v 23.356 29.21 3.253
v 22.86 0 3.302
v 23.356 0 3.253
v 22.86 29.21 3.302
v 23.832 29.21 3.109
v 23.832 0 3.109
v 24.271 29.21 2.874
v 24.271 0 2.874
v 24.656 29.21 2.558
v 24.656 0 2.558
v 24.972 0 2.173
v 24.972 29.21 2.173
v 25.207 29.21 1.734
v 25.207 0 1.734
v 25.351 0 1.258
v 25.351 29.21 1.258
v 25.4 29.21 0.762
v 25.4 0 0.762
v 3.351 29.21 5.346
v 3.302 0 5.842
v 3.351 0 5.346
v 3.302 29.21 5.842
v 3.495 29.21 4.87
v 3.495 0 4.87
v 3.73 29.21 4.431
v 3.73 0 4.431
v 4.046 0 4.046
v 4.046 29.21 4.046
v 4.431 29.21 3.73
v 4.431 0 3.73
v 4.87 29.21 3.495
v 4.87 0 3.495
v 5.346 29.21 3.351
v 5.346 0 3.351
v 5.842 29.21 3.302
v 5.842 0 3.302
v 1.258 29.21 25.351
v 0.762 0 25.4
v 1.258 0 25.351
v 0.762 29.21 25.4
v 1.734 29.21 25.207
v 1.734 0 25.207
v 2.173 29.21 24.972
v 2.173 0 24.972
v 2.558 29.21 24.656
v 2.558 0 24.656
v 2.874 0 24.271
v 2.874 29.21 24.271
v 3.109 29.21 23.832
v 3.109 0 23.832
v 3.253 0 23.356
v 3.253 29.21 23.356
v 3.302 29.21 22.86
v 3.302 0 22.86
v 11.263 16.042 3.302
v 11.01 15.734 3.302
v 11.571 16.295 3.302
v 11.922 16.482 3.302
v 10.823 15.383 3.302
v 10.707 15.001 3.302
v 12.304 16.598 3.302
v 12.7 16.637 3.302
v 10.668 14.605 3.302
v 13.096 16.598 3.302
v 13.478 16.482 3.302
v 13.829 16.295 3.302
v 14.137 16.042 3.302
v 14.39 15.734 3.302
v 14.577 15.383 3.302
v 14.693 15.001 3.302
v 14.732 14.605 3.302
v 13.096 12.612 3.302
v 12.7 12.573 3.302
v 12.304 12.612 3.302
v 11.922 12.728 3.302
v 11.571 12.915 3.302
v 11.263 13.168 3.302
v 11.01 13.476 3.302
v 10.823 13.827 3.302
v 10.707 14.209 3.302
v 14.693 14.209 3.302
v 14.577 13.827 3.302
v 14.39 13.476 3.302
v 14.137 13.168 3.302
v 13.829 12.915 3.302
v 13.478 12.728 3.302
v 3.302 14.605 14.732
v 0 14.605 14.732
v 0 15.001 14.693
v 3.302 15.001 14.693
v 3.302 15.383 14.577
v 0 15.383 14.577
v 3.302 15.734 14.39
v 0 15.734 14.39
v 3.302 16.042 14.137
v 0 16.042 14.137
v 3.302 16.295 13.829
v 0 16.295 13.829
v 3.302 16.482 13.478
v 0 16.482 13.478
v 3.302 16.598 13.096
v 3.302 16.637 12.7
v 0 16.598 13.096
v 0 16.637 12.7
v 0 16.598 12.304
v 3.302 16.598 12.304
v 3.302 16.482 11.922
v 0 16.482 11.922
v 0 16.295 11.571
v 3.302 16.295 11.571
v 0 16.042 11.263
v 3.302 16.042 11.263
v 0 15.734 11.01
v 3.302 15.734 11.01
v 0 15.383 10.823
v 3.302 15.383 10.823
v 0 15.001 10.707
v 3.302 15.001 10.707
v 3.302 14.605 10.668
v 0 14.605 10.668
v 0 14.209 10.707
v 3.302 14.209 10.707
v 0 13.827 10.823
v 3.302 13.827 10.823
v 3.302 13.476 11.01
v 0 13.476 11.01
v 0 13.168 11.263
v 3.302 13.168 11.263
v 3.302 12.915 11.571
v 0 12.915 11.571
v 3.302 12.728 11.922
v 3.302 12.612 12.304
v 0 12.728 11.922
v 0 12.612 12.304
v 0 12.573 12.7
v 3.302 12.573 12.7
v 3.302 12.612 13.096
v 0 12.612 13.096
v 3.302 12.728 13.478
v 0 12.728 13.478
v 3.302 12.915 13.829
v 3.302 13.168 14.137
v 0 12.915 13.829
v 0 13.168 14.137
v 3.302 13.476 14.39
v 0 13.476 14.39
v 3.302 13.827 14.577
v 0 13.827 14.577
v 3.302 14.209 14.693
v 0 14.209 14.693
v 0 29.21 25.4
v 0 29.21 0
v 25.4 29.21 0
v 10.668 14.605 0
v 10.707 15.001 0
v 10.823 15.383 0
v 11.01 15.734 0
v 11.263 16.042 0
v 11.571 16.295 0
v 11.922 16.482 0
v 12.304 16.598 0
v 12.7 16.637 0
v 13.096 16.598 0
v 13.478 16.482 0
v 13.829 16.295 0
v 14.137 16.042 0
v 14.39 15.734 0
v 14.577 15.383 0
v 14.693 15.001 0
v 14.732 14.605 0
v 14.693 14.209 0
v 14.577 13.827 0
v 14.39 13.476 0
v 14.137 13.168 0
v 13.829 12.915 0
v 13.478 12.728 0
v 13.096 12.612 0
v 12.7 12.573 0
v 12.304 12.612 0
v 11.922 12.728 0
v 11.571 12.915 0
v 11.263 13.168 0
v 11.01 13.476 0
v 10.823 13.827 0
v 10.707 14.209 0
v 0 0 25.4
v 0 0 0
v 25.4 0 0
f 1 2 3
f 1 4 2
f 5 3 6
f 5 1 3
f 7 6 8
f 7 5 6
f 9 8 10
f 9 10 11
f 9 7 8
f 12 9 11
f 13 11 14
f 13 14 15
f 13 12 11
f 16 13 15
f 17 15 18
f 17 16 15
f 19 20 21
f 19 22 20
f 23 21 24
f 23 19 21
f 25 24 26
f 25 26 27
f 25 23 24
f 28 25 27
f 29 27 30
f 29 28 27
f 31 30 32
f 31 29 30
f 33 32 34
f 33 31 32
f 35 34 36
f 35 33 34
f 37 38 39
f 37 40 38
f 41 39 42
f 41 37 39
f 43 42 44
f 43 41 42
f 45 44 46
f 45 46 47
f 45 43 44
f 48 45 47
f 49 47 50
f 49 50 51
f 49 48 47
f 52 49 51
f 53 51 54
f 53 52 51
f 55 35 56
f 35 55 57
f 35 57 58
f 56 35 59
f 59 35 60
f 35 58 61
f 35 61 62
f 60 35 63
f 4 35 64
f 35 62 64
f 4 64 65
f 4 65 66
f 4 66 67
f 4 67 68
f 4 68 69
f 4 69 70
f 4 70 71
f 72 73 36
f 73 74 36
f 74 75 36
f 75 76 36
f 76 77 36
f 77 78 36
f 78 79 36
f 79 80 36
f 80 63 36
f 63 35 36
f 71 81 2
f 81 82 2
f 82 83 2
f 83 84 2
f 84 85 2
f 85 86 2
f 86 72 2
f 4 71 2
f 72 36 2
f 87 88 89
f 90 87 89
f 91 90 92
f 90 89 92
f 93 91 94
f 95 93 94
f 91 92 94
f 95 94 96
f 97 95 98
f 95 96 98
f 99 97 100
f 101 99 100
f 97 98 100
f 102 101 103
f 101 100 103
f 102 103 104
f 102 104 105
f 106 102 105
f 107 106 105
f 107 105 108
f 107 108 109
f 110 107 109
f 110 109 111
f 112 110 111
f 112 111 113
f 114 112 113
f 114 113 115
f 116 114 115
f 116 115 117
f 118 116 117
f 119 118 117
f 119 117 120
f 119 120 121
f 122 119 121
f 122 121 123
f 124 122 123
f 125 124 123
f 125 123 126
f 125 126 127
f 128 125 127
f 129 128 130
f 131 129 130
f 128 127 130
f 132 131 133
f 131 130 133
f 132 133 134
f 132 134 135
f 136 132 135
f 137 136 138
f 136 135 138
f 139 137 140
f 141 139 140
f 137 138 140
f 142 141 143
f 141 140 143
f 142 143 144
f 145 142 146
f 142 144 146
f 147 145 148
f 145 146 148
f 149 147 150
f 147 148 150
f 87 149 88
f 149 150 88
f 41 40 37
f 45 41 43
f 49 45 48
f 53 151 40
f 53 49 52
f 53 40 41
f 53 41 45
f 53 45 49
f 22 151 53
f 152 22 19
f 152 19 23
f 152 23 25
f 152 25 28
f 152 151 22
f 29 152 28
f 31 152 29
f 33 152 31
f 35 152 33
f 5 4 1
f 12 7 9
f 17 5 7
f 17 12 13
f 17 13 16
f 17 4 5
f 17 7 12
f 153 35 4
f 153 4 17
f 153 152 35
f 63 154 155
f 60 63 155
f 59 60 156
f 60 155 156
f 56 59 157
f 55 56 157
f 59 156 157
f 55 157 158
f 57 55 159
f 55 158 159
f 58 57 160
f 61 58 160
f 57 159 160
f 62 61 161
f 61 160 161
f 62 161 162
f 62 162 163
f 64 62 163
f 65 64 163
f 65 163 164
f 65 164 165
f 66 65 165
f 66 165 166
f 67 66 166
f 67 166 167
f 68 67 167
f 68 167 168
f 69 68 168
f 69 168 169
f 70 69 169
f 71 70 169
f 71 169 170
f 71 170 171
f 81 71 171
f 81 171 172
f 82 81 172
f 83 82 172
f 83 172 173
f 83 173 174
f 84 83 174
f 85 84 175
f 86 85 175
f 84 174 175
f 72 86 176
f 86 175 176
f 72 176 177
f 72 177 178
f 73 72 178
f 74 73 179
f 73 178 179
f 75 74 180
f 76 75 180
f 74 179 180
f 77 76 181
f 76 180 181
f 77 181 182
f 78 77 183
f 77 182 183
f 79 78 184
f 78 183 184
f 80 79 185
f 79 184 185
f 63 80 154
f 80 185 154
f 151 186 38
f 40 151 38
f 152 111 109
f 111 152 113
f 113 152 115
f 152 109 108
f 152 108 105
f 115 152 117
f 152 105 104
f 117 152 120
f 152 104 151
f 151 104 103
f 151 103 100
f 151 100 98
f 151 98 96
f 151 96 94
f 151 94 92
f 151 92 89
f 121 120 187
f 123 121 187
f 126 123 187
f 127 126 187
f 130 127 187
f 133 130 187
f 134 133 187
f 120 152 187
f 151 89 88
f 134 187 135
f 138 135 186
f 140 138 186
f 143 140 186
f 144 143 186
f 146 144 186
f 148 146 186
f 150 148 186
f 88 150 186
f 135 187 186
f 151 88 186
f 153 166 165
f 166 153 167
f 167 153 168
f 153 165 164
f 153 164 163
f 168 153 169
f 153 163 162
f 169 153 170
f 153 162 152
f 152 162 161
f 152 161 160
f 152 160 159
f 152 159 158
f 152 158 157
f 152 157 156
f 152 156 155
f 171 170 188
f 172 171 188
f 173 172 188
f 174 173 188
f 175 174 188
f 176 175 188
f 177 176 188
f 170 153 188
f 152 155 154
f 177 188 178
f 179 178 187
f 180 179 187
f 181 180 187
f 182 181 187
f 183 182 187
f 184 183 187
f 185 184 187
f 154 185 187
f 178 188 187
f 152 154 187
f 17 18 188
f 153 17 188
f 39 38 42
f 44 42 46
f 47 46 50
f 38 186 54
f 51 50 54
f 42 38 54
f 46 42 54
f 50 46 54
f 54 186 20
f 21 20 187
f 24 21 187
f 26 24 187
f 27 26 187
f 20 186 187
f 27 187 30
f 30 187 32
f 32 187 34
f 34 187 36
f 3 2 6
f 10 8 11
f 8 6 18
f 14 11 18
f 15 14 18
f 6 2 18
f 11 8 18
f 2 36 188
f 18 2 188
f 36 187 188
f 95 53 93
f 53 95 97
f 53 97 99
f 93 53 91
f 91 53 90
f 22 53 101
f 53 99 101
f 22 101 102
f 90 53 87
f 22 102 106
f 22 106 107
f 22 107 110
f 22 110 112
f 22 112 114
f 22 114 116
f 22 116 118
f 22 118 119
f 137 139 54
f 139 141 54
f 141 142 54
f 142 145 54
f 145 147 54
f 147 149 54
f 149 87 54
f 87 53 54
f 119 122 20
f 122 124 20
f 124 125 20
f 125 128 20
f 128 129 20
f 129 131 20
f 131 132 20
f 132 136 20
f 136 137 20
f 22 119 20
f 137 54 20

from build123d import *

# Parameters (mm, degrees)
BOSS_EXTRUDE1_DEPTH = 29.21
FILLET1_R           = 2.54
SKETCH2_R           = 2.032
CUT_EXTRUDE1_DEPTH  = 26.4
SKETCH3_R           = 2.032
CUT_EXTRUDE2_DEPTH  = 26.4


with BuildPart() as part:
    # Sketch1 → Boss-Extrude1 (new body)
    with BuildSketch(Plane(origin=(0, 0, 0), x_dir=(1, 0, 0), z_dir=(0, 1, 0))):
        Polygon((0, 0), (0, -25.4), (3.302, -25.4), (3.302, -3.302), (25.4, -3.302), (25.4, 0), align=None)
    extrude(amount=BOSS_EXTRUDE1_DEPTH)

    # Fillet1
    fillet1_edges = [part.edges().sort_by_distance(p)[0] for p in [
        (25.4, 14.605, 3.302),
        (3.302, 14.605, 3.302),
        (3.302, 14.605, 25.4),
    ]]
    fillet(fillet1_edges, radius=FILLET1_R)

    # Sketch2 → Cut-Extrude1 (cut, through all)
    with BuildSketch(Plane.ZY):
        with Locations((12.7, 14.605)):
            Circle(SKETCH2_R)
    extrude(amount=-CUT_EXTRUDE1_DEPTH, mode=Mode.SUBTRACT)

    # Sketch3 → Cut-Extrude2 (cut, through all)
    with BuildSketch(Plane(origin=(0, 0, 0), x_dir=(-1, 0, 0), z_dir=(0, 0, -1))):
        with Locations((-12.7, 14.605)):
            Circle(SKETCH3_R)
    extrude(amount=-CUT_EXTRUDE2_DEPTH, mode=Mode.SUBTRACT)


solid = part.part
